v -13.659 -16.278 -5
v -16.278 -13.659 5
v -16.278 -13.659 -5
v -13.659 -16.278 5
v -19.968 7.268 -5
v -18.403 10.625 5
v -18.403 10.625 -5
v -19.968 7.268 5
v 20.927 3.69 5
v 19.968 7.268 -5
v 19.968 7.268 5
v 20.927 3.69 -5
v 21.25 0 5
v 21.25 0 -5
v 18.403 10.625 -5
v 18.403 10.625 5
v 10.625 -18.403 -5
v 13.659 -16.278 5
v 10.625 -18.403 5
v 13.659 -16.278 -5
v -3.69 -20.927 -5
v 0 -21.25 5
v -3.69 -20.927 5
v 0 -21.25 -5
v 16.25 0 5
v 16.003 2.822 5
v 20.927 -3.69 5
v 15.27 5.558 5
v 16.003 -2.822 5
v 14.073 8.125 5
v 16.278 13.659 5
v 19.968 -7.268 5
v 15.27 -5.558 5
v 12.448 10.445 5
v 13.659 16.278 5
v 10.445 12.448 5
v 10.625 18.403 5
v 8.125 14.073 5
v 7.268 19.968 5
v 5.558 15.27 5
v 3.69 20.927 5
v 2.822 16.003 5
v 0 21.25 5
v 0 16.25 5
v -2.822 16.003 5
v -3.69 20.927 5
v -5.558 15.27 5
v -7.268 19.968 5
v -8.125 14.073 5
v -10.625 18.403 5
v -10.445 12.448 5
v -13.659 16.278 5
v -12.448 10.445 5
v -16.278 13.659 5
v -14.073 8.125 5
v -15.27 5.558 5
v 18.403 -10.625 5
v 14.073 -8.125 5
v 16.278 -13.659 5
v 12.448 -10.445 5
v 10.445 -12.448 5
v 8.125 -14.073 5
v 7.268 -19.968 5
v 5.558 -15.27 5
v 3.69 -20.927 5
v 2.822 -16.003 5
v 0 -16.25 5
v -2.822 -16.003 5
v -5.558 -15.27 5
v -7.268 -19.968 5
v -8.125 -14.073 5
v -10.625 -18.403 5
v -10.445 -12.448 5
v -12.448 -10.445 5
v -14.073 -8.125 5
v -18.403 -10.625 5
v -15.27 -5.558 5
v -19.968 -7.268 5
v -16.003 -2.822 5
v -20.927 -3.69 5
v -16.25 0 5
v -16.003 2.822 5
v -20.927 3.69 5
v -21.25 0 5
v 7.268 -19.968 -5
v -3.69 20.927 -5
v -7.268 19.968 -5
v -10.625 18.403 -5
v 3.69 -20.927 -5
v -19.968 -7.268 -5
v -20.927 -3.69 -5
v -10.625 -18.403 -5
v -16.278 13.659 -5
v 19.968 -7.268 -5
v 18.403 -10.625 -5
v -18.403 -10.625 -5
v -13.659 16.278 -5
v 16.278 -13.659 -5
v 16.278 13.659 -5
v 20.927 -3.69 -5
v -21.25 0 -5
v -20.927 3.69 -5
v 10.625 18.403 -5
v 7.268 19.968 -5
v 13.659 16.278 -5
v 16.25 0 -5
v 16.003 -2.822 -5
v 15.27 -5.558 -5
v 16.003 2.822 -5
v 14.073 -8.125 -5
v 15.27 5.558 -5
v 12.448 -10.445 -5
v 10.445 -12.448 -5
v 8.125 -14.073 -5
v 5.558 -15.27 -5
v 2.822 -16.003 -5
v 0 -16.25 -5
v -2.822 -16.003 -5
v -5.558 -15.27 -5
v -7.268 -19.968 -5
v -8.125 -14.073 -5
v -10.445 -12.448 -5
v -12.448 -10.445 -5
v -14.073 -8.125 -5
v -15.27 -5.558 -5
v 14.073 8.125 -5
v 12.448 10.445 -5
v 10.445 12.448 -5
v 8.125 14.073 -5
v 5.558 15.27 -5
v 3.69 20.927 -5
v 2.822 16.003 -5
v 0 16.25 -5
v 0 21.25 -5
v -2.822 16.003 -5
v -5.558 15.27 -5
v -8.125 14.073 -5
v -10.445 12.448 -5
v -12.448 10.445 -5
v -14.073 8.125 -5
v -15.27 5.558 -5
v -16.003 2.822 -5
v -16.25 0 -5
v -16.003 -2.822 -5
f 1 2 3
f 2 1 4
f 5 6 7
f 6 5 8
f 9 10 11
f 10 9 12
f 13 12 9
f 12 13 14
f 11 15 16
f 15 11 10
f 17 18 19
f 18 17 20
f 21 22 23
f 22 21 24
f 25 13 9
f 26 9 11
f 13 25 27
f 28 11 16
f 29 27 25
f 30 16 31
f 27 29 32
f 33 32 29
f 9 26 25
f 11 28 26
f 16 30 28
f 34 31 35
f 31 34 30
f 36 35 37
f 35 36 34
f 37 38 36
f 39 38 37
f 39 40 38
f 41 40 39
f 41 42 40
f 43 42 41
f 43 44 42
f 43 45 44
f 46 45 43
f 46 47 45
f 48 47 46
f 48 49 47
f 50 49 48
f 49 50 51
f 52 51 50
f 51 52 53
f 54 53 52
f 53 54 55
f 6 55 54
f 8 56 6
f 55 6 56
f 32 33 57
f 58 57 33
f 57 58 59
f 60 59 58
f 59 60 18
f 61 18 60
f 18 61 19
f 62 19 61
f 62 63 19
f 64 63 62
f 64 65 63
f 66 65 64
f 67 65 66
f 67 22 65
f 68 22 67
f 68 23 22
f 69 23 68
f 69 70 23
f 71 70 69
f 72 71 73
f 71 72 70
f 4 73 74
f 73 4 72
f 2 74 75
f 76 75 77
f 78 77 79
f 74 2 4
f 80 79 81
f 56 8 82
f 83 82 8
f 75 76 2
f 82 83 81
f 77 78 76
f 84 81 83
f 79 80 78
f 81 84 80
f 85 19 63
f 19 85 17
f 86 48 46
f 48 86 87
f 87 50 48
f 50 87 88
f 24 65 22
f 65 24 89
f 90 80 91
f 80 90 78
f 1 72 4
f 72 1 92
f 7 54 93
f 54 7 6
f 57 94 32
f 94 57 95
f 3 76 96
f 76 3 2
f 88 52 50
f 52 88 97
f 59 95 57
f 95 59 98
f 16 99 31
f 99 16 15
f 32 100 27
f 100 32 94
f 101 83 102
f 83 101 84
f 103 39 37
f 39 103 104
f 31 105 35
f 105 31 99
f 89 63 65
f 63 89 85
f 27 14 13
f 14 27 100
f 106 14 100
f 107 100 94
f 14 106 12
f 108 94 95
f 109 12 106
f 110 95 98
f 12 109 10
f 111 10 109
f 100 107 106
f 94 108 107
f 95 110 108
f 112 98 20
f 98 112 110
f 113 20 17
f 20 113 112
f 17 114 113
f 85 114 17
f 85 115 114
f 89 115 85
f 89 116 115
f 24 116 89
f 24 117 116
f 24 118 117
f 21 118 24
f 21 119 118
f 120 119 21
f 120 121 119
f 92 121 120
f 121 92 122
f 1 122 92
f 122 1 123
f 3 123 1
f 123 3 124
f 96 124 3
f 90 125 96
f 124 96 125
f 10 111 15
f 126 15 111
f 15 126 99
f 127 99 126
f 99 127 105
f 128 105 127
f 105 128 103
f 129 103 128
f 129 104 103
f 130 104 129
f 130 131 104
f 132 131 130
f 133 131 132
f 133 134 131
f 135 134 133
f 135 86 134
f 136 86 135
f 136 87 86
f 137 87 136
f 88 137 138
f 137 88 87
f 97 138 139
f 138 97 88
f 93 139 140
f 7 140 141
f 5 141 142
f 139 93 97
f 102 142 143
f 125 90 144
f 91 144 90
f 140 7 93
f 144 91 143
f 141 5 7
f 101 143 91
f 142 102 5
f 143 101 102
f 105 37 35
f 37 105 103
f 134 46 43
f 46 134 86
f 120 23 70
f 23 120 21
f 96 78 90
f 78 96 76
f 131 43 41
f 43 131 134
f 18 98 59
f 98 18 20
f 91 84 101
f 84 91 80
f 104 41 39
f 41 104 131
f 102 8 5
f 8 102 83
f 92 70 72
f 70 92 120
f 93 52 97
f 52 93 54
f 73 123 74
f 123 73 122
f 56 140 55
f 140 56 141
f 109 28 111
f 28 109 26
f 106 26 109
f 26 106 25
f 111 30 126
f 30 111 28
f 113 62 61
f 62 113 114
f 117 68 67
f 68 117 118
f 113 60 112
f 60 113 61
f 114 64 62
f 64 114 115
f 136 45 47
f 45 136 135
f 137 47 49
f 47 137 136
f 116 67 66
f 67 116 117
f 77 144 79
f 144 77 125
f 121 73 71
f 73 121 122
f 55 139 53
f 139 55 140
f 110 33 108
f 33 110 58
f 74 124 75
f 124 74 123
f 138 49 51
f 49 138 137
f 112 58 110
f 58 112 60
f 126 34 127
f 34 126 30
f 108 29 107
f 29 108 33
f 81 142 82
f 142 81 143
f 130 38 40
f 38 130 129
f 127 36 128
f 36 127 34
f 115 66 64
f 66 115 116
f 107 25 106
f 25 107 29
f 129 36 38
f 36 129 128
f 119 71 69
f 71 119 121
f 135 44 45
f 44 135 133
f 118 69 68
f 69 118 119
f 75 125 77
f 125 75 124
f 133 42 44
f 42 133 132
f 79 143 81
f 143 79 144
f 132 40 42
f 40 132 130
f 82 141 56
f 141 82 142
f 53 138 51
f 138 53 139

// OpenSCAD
//Rolling pin rings for uniform thickness of dough
//2019.01.05. by MicroWizard
//This software is in the Public Domain

//You must set parameters...
//... typically for sweet christmas cookies with honey
//I used to cut them with Oogime brand cookie cutters.
rolling_pin_diameter	= 32.5;	//in millimeters
dough_thickness			=  5.0; //in millimeters
ring_width				= 10.0; //in millimeters

/*
//... typically for small cheese scones
//I used to cut them with 25mm dia round cutter.
rolling_pin_diameter	= 32.5;	//in millimeters
dough_thickness			= 10.0; //in millimeters
ring_width				= 15.0; //in millimeters
*/

//Originally...
//2017.04.15. Mamanak fondant, marcipan nyujtashoz sodrofa gyuru
$fn=36;

//belso atmero, (teszta)vastagsag, gyuru szelesseg
module gyuru(db,vas,szel){
    difference(){
        cylinder(d1=db+2*vas,d2=db+2*vas,h=szel, center=true);
        cylinder(d1=db,d2=db,h=szel+1, center=true);
    }
}

//belso atmero, (teszta)vastagsag, gyuru szelesseg
gyuru(rolling_pin_diameter, dough_thickness, ring_width);
